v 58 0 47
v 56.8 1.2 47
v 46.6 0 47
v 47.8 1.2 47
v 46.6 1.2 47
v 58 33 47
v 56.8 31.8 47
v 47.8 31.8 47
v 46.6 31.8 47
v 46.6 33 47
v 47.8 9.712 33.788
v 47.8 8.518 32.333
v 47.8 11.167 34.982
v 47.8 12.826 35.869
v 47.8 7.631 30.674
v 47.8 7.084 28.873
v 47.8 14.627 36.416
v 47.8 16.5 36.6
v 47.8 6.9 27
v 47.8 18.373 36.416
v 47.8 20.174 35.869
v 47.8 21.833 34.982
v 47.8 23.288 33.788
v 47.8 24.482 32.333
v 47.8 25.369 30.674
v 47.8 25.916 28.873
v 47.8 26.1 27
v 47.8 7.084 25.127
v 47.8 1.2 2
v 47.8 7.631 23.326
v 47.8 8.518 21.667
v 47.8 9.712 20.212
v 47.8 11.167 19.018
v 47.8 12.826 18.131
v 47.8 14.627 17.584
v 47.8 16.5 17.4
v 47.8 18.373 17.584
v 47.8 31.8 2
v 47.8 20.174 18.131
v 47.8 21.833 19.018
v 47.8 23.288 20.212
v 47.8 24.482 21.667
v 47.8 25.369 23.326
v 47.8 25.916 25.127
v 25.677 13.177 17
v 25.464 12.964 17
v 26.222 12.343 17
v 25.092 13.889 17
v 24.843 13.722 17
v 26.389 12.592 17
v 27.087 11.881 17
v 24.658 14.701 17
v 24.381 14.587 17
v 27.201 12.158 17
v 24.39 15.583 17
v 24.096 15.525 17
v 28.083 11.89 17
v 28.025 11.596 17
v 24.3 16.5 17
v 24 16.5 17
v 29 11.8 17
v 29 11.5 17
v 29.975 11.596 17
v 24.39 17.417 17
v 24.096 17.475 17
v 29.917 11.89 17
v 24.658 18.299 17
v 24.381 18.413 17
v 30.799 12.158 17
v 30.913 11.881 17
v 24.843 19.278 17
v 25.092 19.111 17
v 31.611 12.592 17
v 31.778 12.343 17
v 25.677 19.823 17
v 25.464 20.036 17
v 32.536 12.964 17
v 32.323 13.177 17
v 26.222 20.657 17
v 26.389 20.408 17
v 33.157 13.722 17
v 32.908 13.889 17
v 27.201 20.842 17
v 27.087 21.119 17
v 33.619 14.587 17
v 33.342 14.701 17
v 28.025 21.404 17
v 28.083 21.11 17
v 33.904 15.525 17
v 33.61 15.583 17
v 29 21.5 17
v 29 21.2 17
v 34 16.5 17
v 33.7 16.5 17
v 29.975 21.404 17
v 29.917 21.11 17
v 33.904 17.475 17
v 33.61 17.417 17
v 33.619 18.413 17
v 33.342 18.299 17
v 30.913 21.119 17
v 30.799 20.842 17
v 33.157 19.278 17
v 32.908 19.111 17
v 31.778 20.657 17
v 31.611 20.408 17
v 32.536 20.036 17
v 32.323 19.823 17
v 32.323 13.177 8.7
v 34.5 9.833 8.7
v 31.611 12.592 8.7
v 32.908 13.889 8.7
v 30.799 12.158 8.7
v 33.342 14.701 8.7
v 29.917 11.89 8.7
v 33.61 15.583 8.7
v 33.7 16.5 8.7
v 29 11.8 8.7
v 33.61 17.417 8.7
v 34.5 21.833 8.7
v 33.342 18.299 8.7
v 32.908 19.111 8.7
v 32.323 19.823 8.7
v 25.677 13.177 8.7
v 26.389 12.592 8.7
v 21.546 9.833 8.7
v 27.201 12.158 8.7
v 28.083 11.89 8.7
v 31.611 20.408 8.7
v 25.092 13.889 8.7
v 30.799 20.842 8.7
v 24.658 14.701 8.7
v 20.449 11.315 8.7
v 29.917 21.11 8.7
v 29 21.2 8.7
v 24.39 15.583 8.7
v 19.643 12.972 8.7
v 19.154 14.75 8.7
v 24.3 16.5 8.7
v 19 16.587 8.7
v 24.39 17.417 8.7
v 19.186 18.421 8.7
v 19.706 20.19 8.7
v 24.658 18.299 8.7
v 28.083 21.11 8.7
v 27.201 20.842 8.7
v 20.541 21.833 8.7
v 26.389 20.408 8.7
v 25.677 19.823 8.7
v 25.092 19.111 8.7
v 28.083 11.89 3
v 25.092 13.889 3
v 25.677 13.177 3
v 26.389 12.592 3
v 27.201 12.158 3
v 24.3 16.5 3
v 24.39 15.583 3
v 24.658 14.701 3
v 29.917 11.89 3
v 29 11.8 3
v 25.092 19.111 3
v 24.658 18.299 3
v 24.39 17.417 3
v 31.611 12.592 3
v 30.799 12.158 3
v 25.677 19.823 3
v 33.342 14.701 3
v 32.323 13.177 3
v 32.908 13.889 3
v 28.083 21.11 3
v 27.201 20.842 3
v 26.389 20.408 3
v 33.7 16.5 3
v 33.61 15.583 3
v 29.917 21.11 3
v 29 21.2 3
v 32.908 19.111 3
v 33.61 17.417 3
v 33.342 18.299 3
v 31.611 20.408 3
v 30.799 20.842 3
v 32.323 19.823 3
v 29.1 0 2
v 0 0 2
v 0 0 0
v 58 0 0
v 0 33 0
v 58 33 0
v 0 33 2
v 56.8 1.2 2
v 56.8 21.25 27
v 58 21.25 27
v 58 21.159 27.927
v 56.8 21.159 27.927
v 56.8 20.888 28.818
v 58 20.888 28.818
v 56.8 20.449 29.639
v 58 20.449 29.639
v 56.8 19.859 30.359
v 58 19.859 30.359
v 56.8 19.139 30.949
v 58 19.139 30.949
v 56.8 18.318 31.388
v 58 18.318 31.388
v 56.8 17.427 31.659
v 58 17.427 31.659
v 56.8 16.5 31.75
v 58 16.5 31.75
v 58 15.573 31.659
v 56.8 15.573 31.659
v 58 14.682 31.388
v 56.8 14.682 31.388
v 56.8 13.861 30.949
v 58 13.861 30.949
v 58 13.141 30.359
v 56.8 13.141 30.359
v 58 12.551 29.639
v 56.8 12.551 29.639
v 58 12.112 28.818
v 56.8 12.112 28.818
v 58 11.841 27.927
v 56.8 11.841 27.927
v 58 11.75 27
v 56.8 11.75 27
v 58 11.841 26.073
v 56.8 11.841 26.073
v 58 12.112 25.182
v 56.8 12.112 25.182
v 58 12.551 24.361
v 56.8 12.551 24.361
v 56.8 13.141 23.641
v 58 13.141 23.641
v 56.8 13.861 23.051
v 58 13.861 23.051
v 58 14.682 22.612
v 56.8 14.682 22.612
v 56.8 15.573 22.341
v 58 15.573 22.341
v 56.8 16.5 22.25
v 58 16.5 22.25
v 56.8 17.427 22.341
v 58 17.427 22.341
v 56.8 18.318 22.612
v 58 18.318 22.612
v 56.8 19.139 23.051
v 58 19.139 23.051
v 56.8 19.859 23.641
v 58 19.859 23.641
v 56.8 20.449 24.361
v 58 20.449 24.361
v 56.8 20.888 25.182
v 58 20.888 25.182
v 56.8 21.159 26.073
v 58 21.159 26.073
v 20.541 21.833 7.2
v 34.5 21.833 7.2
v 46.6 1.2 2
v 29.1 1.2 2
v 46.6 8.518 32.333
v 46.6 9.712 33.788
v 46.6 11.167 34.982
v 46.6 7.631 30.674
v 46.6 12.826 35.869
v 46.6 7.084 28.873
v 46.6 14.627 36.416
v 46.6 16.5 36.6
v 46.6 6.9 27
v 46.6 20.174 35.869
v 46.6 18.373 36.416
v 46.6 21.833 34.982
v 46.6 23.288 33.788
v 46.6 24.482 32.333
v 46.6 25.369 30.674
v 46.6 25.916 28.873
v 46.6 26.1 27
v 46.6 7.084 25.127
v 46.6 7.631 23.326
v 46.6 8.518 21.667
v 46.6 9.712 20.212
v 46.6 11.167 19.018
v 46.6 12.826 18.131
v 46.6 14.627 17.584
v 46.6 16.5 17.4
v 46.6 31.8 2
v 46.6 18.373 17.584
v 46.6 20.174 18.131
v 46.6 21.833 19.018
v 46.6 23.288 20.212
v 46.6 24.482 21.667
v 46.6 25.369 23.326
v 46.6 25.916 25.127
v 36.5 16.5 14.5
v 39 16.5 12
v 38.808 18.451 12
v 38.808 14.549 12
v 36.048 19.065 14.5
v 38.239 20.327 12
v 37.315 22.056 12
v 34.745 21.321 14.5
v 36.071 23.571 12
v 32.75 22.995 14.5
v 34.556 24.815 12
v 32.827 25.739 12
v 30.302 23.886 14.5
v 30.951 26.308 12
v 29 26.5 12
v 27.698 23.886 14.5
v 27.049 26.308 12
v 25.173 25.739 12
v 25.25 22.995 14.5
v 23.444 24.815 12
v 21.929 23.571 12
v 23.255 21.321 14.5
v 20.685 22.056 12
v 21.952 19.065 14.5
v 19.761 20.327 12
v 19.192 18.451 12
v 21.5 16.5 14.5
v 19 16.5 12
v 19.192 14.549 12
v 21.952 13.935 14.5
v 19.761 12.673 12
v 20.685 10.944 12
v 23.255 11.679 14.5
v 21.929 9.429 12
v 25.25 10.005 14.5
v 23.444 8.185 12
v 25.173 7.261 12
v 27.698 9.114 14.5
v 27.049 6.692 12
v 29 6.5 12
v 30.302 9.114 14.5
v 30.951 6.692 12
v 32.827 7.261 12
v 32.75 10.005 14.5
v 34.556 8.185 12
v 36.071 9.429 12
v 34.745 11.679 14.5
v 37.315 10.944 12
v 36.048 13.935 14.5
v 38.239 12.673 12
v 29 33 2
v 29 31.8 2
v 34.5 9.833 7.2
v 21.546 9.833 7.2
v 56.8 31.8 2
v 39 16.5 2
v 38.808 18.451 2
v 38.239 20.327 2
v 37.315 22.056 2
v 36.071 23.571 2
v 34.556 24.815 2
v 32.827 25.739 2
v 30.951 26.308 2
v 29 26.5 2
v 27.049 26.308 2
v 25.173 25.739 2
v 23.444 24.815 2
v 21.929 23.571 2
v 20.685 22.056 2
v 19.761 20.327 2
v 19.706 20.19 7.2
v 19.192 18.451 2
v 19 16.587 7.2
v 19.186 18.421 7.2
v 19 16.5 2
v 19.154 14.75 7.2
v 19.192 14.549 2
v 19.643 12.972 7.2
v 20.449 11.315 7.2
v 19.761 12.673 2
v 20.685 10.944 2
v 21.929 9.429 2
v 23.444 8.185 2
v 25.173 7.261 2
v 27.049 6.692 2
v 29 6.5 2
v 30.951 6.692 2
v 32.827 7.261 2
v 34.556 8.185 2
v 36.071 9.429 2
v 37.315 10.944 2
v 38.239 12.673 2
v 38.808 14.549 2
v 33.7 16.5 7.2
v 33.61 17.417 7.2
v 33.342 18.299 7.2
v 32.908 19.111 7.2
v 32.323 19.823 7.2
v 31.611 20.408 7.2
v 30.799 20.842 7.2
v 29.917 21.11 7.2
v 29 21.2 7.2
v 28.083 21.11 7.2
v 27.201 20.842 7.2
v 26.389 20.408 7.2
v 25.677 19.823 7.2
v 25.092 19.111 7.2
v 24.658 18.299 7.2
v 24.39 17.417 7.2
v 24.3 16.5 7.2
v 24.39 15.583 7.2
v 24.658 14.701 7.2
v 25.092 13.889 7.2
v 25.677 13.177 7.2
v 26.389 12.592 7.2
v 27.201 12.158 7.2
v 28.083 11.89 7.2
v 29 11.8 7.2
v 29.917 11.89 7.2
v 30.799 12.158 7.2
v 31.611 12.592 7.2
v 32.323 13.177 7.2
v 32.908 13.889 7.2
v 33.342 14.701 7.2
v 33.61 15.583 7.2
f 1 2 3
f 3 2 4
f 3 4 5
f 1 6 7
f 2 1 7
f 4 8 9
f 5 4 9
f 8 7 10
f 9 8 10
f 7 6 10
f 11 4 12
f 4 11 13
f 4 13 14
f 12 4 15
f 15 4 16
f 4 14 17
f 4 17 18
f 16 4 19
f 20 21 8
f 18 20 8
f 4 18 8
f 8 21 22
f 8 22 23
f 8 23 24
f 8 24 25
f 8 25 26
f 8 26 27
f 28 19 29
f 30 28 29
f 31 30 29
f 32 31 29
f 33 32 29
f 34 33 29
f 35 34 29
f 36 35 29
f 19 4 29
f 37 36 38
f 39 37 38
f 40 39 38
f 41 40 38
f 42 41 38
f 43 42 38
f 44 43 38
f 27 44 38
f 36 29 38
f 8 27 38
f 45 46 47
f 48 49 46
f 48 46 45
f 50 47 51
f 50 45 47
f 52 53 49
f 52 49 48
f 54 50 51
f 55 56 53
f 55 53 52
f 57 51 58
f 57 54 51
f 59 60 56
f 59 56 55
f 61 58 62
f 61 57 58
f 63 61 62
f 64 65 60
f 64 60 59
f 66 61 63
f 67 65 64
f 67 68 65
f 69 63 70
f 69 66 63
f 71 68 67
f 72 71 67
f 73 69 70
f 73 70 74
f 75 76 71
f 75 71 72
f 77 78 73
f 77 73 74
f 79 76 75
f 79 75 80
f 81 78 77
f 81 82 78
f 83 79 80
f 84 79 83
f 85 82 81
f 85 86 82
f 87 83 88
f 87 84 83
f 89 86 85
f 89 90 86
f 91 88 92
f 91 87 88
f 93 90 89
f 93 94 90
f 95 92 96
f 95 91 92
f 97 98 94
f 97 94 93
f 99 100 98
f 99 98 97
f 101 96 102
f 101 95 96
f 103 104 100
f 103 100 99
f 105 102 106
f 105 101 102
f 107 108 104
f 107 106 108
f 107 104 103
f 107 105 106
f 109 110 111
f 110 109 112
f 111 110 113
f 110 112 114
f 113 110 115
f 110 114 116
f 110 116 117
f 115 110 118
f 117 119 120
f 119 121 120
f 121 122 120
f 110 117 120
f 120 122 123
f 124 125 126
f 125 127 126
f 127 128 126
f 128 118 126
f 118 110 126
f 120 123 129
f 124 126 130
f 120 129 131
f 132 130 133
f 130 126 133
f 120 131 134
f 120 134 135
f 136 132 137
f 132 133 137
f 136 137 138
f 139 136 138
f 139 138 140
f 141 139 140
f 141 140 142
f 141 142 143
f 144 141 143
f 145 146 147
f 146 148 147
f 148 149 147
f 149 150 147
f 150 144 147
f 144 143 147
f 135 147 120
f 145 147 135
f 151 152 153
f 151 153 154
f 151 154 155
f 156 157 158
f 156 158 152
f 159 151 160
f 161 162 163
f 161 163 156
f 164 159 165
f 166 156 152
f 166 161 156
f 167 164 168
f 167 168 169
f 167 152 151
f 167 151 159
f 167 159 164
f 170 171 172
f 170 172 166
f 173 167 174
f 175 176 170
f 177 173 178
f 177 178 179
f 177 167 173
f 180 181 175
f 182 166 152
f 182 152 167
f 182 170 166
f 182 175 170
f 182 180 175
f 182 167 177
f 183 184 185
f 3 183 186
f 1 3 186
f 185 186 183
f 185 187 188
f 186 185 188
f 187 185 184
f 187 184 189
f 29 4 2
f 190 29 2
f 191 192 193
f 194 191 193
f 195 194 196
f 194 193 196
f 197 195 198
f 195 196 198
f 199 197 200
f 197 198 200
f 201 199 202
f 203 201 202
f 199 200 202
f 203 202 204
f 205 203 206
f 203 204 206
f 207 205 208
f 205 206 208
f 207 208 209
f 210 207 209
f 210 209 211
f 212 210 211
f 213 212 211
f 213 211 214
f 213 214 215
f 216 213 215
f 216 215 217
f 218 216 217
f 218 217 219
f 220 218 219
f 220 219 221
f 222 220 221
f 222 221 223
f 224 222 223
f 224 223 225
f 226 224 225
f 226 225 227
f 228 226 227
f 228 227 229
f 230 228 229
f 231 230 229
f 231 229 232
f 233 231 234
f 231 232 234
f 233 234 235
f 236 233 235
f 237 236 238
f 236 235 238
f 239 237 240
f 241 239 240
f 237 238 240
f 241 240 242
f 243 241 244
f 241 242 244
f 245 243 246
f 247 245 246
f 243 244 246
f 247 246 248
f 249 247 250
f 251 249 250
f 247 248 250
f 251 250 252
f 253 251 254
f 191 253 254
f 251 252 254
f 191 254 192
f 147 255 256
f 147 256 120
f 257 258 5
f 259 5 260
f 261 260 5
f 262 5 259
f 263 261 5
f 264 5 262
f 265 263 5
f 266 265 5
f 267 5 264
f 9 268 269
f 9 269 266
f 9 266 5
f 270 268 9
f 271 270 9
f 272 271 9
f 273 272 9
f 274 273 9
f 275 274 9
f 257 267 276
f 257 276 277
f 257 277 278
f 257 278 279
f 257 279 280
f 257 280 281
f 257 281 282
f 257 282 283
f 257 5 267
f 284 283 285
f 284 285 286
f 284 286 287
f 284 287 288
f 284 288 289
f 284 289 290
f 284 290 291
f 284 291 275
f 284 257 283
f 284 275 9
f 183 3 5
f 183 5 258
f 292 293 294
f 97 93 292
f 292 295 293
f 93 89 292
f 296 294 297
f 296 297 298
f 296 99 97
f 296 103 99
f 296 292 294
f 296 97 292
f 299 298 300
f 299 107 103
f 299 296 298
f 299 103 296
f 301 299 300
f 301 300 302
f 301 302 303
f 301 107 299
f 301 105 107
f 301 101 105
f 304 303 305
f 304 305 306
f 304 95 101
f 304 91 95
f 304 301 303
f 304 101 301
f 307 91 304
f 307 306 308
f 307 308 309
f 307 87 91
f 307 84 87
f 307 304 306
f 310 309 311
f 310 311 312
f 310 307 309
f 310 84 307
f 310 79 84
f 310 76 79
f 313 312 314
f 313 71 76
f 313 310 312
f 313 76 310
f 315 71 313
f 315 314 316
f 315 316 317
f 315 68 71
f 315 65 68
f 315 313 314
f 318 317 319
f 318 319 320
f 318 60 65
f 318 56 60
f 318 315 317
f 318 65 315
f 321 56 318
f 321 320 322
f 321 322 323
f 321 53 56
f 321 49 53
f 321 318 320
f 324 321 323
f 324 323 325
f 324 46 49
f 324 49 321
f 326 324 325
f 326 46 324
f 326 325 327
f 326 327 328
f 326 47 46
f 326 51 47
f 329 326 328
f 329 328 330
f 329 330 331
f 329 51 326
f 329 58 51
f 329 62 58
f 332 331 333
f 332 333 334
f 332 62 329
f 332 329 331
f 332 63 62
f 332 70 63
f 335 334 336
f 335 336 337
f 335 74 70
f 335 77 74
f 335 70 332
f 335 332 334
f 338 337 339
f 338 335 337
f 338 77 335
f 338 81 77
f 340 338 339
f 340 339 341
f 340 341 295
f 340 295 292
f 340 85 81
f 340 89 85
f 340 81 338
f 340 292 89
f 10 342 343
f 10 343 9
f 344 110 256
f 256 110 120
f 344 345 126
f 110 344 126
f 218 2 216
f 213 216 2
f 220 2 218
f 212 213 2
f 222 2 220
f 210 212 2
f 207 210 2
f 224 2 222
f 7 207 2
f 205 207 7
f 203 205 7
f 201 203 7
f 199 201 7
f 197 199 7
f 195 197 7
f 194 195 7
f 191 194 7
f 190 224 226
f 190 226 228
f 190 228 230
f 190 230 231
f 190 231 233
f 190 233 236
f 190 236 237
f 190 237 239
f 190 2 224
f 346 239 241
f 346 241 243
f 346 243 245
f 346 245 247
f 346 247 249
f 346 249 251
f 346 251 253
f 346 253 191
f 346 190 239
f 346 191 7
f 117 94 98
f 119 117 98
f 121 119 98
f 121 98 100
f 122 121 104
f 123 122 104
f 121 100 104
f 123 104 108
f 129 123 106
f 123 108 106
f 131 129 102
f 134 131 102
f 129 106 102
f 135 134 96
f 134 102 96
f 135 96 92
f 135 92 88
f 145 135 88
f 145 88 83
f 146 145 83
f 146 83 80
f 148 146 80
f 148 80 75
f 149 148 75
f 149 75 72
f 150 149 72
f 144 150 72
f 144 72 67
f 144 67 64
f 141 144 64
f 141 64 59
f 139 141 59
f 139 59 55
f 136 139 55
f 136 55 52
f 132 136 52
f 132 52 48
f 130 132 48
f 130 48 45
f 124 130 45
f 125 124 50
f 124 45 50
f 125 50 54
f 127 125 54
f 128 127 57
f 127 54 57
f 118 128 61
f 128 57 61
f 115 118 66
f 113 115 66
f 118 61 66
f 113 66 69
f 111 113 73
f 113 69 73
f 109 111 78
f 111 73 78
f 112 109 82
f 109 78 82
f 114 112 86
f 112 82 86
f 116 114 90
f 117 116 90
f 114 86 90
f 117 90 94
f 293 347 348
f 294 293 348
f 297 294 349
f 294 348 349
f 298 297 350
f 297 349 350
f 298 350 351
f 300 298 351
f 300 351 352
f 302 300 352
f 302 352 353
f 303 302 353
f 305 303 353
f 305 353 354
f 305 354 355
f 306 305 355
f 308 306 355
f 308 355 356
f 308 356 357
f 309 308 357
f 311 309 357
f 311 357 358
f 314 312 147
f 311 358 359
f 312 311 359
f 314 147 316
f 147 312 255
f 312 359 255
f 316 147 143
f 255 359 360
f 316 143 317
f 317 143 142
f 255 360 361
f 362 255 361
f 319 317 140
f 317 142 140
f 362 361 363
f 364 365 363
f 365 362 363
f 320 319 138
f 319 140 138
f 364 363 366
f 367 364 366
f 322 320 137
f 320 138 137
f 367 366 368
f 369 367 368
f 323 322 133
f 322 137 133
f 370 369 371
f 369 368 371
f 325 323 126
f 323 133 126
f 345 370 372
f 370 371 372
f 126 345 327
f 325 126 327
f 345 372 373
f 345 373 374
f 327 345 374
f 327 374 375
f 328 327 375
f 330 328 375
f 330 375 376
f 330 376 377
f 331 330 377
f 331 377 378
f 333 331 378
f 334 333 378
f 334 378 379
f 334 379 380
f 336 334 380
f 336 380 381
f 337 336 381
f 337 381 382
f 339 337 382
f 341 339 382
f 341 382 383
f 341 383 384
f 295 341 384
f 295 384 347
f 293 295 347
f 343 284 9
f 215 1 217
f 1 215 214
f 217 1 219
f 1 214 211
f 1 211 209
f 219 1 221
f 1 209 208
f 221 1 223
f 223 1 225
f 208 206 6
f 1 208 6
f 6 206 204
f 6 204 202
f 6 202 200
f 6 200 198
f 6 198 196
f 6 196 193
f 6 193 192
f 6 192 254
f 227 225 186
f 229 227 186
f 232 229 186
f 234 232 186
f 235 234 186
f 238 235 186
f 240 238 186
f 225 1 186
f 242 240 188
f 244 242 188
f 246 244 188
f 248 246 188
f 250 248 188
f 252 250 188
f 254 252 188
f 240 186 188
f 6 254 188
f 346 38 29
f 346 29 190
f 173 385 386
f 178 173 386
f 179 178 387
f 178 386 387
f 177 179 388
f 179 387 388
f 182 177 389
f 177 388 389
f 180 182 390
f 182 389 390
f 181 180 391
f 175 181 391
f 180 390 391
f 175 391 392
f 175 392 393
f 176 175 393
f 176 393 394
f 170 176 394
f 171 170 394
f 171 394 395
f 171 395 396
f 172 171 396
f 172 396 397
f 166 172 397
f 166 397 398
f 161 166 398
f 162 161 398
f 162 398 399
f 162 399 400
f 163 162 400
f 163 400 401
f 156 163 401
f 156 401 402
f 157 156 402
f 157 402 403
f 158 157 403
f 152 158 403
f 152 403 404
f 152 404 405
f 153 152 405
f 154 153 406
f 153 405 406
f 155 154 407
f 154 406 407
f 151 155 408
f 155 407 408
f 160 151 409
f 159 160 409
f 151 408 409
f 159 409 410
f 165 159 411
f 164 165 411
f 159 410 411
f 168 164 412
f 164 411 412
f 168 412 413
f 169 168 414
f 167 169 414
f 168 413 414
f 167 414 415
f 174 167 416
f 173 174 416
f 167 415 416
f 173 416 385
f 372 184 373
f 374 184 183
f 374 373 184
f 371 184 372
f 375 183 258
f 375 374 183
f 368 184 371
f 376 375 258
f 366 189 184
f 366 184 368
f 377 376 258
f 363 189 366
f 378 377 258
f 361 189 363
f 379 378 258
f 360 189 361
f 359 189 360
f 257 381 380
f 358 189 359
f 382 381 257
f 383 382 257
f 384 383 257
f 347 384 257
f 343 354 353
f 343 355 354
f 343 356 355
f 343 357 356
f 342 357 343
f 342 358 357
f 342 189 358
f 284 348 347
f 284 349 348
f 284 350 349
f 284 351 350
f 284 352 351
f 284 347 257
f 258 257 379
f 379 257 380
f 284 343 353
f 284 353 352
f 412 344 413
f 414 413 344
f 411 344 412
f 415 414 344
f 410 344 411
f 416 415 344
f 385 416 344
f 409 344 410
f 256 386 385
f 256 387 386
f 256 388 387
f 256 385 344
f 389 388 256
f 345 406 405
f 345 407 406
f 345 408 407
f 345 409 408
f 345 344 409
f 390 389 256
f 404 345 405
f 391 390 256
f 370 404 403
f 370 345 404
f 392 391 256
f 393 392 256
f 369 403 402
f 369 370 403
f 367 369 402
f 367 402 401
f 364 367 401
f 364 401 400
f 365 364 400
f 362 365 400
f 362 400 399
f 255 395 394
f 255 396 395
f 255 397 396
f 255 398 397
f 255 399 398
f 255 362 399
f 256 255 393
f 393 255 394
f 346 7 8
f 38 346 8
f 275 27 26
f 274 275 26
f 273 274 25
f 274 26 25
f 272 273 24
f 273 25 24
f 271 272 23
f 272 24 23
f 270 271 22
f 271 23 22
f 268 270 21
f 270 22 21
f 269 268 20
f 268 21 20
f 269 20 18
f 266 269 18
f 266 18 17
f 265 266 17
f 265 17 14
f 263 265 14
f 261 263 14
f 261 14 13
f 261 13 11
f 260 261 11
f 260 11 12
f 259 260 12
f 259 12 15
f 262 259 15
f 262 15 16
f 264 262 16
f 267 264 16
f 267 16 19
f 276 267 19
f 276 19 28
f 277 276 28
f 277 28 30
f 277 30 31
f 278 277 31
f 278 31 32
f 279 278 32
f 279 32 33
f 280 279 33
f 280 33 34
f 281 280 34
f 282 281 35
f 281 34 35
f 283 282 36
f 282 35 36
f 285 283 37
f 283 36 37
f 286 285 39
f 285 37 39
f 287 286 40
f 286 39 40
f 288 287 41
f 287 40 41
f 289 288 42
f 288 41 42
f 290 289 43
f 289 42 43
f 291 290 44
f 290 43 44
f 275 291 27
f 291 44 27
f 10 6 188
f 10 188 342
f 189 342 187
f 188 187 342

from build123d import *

# Parameters (mm, degrees)
F0_W      = 58
F0_H      = 33
F1_DEPTH  = 2
F2_R      = 10
F3_DEPTH  = 15
F4_R      = 4.7
F5_DEPTH  = 14
F6_W      = 12
F6_H      = 1.5
F7_DEPTH  = 34.5
F8_W      = 1.2
F8_H      = 33
F9_DEPTH  = 45
F10_R     = 4.75
F11_DEPTH = 20
F12_W     = 1.2
F12_H     = 33
F13_DEPTH = 45
F14_R     = 9.6
F15_DEPTH = 10
F17_DEPTH = 1.2
F19_DEPTH = 1.2
F20_W     = 9
F20_H     = 45
F21_DEPTH = 1.2
F22_W     = 9
F22_H     = 45
F23_DEPTH = 1.2
F24_SIZE  = 5


with BuildPart() as f1:
    # F0 (on Top) → F1 (new body)
    with BuildSketch(Plane.XY):
        with Locations((29, 16.5)):
            Rectangle(F0_W, F0_H)
    extrude(amount=F1_DEPTH)

    # F2 (on face) → F3 (join)
    with BuildSketch(Plane.XY.offset(2)):
        with Locations((29, 16.5)):
            Circle(F2_R)
    extrude(amount=F3_DEPTH)

    # F4 (on face) → F5 (cut)
    with BuildSketch(Plane.XY.offset(17)):
        with Locations((29, 16.5)):
            Circle(F4_R)
    extrude(amount=-F5_DEPTH, mode=Mode.SUBTRACT)

    # F6 (on Right) → F7 (cut)
    with BuildSketch(Plane.YZ):
        with Locations((15.833333, 7.95)):
            Rectangle(F6_W, F6_H)
    extrude(amount=F7_DEPTH, mode=Mode.SUBTRACT)

    # F8 (on face) → F9 (join)
    with BuildSketch(Plane.XY.offset(2)):
        with Locations((57.4, 16.5)):
            Rectangle(F8_W, F8_H)
    extrude(amount=F9_DEPTH)

    # F10 (on face) → F11 (cut)
    with BuildSketch(Plane.YZ.offset(58)):
        with Locations((16.5, 27)):
            Circle(F10_R)
    extrude(amount=-F11_DEPTH, mode=Mode.SUBTRACT)

    # F12 (on face) → F13 (join)
    with BuildSketch(Plane.XY.offset(2)):
        with Locations((47.2, 16.5)):
            Rectangle(F12_W, F12_H)
    extrude(amount=F13_DEPTH)

    # F14 (on face) → F15 (cut)
    with BuildSketch(Plane.YZ.offset(47.8)):
        with Locations((16.5, 27)):
            Circle(F14_R)
    extrude(amount=-F15_DEPTH, mode=Mode.SUBTRACT)

    # F16 (on Front) → F17 (join)
    with BuildSketch(Plane.XZ):
        Polygon((46.6, 2), (46.6, 47), (29.1, 2), align=None)
    extrude(amount=-F17_DEPTH)

    # F18 (on face) → F19 (join)
    with BuildSketch(Plane(origin=(0, 33, 0), x_dir=(-1, 0, 0), z_dir=(0, 1, 0))):
        Polygon((-29, 2), (-46.6, 47), (-46.6, 2), align=None)
    extrude(amount=-F19_DEPTH)

    # F20 (on Front) → F21 (join)
    with BuildSketch(Plane.XZ):
        with Locations((52.3, 24.5)):
            Rectangle(F20_W, F20_H)
    extrude(amount=-F21_DEPTH)

    # F22 (on face) → F23 (join)
    with BuildSketch(Plane(origin=(0, 33, 0), x_dir=(-1, 0, 0), z_dir=(0, 1, 0))):
        with Locations((-52.3, 24.5)):
            Rectangle(F22_W, F22_H)
    extrude(amount=-F23_DEPTH)

    # F24
    f24_edges = [f1.edges().sort_by_distance(p)[0] for p in [
        (19, 16.5, 17),
    ]]
    chamfer(f24_edges, length=F24_SIZE)


solid = f1.part
